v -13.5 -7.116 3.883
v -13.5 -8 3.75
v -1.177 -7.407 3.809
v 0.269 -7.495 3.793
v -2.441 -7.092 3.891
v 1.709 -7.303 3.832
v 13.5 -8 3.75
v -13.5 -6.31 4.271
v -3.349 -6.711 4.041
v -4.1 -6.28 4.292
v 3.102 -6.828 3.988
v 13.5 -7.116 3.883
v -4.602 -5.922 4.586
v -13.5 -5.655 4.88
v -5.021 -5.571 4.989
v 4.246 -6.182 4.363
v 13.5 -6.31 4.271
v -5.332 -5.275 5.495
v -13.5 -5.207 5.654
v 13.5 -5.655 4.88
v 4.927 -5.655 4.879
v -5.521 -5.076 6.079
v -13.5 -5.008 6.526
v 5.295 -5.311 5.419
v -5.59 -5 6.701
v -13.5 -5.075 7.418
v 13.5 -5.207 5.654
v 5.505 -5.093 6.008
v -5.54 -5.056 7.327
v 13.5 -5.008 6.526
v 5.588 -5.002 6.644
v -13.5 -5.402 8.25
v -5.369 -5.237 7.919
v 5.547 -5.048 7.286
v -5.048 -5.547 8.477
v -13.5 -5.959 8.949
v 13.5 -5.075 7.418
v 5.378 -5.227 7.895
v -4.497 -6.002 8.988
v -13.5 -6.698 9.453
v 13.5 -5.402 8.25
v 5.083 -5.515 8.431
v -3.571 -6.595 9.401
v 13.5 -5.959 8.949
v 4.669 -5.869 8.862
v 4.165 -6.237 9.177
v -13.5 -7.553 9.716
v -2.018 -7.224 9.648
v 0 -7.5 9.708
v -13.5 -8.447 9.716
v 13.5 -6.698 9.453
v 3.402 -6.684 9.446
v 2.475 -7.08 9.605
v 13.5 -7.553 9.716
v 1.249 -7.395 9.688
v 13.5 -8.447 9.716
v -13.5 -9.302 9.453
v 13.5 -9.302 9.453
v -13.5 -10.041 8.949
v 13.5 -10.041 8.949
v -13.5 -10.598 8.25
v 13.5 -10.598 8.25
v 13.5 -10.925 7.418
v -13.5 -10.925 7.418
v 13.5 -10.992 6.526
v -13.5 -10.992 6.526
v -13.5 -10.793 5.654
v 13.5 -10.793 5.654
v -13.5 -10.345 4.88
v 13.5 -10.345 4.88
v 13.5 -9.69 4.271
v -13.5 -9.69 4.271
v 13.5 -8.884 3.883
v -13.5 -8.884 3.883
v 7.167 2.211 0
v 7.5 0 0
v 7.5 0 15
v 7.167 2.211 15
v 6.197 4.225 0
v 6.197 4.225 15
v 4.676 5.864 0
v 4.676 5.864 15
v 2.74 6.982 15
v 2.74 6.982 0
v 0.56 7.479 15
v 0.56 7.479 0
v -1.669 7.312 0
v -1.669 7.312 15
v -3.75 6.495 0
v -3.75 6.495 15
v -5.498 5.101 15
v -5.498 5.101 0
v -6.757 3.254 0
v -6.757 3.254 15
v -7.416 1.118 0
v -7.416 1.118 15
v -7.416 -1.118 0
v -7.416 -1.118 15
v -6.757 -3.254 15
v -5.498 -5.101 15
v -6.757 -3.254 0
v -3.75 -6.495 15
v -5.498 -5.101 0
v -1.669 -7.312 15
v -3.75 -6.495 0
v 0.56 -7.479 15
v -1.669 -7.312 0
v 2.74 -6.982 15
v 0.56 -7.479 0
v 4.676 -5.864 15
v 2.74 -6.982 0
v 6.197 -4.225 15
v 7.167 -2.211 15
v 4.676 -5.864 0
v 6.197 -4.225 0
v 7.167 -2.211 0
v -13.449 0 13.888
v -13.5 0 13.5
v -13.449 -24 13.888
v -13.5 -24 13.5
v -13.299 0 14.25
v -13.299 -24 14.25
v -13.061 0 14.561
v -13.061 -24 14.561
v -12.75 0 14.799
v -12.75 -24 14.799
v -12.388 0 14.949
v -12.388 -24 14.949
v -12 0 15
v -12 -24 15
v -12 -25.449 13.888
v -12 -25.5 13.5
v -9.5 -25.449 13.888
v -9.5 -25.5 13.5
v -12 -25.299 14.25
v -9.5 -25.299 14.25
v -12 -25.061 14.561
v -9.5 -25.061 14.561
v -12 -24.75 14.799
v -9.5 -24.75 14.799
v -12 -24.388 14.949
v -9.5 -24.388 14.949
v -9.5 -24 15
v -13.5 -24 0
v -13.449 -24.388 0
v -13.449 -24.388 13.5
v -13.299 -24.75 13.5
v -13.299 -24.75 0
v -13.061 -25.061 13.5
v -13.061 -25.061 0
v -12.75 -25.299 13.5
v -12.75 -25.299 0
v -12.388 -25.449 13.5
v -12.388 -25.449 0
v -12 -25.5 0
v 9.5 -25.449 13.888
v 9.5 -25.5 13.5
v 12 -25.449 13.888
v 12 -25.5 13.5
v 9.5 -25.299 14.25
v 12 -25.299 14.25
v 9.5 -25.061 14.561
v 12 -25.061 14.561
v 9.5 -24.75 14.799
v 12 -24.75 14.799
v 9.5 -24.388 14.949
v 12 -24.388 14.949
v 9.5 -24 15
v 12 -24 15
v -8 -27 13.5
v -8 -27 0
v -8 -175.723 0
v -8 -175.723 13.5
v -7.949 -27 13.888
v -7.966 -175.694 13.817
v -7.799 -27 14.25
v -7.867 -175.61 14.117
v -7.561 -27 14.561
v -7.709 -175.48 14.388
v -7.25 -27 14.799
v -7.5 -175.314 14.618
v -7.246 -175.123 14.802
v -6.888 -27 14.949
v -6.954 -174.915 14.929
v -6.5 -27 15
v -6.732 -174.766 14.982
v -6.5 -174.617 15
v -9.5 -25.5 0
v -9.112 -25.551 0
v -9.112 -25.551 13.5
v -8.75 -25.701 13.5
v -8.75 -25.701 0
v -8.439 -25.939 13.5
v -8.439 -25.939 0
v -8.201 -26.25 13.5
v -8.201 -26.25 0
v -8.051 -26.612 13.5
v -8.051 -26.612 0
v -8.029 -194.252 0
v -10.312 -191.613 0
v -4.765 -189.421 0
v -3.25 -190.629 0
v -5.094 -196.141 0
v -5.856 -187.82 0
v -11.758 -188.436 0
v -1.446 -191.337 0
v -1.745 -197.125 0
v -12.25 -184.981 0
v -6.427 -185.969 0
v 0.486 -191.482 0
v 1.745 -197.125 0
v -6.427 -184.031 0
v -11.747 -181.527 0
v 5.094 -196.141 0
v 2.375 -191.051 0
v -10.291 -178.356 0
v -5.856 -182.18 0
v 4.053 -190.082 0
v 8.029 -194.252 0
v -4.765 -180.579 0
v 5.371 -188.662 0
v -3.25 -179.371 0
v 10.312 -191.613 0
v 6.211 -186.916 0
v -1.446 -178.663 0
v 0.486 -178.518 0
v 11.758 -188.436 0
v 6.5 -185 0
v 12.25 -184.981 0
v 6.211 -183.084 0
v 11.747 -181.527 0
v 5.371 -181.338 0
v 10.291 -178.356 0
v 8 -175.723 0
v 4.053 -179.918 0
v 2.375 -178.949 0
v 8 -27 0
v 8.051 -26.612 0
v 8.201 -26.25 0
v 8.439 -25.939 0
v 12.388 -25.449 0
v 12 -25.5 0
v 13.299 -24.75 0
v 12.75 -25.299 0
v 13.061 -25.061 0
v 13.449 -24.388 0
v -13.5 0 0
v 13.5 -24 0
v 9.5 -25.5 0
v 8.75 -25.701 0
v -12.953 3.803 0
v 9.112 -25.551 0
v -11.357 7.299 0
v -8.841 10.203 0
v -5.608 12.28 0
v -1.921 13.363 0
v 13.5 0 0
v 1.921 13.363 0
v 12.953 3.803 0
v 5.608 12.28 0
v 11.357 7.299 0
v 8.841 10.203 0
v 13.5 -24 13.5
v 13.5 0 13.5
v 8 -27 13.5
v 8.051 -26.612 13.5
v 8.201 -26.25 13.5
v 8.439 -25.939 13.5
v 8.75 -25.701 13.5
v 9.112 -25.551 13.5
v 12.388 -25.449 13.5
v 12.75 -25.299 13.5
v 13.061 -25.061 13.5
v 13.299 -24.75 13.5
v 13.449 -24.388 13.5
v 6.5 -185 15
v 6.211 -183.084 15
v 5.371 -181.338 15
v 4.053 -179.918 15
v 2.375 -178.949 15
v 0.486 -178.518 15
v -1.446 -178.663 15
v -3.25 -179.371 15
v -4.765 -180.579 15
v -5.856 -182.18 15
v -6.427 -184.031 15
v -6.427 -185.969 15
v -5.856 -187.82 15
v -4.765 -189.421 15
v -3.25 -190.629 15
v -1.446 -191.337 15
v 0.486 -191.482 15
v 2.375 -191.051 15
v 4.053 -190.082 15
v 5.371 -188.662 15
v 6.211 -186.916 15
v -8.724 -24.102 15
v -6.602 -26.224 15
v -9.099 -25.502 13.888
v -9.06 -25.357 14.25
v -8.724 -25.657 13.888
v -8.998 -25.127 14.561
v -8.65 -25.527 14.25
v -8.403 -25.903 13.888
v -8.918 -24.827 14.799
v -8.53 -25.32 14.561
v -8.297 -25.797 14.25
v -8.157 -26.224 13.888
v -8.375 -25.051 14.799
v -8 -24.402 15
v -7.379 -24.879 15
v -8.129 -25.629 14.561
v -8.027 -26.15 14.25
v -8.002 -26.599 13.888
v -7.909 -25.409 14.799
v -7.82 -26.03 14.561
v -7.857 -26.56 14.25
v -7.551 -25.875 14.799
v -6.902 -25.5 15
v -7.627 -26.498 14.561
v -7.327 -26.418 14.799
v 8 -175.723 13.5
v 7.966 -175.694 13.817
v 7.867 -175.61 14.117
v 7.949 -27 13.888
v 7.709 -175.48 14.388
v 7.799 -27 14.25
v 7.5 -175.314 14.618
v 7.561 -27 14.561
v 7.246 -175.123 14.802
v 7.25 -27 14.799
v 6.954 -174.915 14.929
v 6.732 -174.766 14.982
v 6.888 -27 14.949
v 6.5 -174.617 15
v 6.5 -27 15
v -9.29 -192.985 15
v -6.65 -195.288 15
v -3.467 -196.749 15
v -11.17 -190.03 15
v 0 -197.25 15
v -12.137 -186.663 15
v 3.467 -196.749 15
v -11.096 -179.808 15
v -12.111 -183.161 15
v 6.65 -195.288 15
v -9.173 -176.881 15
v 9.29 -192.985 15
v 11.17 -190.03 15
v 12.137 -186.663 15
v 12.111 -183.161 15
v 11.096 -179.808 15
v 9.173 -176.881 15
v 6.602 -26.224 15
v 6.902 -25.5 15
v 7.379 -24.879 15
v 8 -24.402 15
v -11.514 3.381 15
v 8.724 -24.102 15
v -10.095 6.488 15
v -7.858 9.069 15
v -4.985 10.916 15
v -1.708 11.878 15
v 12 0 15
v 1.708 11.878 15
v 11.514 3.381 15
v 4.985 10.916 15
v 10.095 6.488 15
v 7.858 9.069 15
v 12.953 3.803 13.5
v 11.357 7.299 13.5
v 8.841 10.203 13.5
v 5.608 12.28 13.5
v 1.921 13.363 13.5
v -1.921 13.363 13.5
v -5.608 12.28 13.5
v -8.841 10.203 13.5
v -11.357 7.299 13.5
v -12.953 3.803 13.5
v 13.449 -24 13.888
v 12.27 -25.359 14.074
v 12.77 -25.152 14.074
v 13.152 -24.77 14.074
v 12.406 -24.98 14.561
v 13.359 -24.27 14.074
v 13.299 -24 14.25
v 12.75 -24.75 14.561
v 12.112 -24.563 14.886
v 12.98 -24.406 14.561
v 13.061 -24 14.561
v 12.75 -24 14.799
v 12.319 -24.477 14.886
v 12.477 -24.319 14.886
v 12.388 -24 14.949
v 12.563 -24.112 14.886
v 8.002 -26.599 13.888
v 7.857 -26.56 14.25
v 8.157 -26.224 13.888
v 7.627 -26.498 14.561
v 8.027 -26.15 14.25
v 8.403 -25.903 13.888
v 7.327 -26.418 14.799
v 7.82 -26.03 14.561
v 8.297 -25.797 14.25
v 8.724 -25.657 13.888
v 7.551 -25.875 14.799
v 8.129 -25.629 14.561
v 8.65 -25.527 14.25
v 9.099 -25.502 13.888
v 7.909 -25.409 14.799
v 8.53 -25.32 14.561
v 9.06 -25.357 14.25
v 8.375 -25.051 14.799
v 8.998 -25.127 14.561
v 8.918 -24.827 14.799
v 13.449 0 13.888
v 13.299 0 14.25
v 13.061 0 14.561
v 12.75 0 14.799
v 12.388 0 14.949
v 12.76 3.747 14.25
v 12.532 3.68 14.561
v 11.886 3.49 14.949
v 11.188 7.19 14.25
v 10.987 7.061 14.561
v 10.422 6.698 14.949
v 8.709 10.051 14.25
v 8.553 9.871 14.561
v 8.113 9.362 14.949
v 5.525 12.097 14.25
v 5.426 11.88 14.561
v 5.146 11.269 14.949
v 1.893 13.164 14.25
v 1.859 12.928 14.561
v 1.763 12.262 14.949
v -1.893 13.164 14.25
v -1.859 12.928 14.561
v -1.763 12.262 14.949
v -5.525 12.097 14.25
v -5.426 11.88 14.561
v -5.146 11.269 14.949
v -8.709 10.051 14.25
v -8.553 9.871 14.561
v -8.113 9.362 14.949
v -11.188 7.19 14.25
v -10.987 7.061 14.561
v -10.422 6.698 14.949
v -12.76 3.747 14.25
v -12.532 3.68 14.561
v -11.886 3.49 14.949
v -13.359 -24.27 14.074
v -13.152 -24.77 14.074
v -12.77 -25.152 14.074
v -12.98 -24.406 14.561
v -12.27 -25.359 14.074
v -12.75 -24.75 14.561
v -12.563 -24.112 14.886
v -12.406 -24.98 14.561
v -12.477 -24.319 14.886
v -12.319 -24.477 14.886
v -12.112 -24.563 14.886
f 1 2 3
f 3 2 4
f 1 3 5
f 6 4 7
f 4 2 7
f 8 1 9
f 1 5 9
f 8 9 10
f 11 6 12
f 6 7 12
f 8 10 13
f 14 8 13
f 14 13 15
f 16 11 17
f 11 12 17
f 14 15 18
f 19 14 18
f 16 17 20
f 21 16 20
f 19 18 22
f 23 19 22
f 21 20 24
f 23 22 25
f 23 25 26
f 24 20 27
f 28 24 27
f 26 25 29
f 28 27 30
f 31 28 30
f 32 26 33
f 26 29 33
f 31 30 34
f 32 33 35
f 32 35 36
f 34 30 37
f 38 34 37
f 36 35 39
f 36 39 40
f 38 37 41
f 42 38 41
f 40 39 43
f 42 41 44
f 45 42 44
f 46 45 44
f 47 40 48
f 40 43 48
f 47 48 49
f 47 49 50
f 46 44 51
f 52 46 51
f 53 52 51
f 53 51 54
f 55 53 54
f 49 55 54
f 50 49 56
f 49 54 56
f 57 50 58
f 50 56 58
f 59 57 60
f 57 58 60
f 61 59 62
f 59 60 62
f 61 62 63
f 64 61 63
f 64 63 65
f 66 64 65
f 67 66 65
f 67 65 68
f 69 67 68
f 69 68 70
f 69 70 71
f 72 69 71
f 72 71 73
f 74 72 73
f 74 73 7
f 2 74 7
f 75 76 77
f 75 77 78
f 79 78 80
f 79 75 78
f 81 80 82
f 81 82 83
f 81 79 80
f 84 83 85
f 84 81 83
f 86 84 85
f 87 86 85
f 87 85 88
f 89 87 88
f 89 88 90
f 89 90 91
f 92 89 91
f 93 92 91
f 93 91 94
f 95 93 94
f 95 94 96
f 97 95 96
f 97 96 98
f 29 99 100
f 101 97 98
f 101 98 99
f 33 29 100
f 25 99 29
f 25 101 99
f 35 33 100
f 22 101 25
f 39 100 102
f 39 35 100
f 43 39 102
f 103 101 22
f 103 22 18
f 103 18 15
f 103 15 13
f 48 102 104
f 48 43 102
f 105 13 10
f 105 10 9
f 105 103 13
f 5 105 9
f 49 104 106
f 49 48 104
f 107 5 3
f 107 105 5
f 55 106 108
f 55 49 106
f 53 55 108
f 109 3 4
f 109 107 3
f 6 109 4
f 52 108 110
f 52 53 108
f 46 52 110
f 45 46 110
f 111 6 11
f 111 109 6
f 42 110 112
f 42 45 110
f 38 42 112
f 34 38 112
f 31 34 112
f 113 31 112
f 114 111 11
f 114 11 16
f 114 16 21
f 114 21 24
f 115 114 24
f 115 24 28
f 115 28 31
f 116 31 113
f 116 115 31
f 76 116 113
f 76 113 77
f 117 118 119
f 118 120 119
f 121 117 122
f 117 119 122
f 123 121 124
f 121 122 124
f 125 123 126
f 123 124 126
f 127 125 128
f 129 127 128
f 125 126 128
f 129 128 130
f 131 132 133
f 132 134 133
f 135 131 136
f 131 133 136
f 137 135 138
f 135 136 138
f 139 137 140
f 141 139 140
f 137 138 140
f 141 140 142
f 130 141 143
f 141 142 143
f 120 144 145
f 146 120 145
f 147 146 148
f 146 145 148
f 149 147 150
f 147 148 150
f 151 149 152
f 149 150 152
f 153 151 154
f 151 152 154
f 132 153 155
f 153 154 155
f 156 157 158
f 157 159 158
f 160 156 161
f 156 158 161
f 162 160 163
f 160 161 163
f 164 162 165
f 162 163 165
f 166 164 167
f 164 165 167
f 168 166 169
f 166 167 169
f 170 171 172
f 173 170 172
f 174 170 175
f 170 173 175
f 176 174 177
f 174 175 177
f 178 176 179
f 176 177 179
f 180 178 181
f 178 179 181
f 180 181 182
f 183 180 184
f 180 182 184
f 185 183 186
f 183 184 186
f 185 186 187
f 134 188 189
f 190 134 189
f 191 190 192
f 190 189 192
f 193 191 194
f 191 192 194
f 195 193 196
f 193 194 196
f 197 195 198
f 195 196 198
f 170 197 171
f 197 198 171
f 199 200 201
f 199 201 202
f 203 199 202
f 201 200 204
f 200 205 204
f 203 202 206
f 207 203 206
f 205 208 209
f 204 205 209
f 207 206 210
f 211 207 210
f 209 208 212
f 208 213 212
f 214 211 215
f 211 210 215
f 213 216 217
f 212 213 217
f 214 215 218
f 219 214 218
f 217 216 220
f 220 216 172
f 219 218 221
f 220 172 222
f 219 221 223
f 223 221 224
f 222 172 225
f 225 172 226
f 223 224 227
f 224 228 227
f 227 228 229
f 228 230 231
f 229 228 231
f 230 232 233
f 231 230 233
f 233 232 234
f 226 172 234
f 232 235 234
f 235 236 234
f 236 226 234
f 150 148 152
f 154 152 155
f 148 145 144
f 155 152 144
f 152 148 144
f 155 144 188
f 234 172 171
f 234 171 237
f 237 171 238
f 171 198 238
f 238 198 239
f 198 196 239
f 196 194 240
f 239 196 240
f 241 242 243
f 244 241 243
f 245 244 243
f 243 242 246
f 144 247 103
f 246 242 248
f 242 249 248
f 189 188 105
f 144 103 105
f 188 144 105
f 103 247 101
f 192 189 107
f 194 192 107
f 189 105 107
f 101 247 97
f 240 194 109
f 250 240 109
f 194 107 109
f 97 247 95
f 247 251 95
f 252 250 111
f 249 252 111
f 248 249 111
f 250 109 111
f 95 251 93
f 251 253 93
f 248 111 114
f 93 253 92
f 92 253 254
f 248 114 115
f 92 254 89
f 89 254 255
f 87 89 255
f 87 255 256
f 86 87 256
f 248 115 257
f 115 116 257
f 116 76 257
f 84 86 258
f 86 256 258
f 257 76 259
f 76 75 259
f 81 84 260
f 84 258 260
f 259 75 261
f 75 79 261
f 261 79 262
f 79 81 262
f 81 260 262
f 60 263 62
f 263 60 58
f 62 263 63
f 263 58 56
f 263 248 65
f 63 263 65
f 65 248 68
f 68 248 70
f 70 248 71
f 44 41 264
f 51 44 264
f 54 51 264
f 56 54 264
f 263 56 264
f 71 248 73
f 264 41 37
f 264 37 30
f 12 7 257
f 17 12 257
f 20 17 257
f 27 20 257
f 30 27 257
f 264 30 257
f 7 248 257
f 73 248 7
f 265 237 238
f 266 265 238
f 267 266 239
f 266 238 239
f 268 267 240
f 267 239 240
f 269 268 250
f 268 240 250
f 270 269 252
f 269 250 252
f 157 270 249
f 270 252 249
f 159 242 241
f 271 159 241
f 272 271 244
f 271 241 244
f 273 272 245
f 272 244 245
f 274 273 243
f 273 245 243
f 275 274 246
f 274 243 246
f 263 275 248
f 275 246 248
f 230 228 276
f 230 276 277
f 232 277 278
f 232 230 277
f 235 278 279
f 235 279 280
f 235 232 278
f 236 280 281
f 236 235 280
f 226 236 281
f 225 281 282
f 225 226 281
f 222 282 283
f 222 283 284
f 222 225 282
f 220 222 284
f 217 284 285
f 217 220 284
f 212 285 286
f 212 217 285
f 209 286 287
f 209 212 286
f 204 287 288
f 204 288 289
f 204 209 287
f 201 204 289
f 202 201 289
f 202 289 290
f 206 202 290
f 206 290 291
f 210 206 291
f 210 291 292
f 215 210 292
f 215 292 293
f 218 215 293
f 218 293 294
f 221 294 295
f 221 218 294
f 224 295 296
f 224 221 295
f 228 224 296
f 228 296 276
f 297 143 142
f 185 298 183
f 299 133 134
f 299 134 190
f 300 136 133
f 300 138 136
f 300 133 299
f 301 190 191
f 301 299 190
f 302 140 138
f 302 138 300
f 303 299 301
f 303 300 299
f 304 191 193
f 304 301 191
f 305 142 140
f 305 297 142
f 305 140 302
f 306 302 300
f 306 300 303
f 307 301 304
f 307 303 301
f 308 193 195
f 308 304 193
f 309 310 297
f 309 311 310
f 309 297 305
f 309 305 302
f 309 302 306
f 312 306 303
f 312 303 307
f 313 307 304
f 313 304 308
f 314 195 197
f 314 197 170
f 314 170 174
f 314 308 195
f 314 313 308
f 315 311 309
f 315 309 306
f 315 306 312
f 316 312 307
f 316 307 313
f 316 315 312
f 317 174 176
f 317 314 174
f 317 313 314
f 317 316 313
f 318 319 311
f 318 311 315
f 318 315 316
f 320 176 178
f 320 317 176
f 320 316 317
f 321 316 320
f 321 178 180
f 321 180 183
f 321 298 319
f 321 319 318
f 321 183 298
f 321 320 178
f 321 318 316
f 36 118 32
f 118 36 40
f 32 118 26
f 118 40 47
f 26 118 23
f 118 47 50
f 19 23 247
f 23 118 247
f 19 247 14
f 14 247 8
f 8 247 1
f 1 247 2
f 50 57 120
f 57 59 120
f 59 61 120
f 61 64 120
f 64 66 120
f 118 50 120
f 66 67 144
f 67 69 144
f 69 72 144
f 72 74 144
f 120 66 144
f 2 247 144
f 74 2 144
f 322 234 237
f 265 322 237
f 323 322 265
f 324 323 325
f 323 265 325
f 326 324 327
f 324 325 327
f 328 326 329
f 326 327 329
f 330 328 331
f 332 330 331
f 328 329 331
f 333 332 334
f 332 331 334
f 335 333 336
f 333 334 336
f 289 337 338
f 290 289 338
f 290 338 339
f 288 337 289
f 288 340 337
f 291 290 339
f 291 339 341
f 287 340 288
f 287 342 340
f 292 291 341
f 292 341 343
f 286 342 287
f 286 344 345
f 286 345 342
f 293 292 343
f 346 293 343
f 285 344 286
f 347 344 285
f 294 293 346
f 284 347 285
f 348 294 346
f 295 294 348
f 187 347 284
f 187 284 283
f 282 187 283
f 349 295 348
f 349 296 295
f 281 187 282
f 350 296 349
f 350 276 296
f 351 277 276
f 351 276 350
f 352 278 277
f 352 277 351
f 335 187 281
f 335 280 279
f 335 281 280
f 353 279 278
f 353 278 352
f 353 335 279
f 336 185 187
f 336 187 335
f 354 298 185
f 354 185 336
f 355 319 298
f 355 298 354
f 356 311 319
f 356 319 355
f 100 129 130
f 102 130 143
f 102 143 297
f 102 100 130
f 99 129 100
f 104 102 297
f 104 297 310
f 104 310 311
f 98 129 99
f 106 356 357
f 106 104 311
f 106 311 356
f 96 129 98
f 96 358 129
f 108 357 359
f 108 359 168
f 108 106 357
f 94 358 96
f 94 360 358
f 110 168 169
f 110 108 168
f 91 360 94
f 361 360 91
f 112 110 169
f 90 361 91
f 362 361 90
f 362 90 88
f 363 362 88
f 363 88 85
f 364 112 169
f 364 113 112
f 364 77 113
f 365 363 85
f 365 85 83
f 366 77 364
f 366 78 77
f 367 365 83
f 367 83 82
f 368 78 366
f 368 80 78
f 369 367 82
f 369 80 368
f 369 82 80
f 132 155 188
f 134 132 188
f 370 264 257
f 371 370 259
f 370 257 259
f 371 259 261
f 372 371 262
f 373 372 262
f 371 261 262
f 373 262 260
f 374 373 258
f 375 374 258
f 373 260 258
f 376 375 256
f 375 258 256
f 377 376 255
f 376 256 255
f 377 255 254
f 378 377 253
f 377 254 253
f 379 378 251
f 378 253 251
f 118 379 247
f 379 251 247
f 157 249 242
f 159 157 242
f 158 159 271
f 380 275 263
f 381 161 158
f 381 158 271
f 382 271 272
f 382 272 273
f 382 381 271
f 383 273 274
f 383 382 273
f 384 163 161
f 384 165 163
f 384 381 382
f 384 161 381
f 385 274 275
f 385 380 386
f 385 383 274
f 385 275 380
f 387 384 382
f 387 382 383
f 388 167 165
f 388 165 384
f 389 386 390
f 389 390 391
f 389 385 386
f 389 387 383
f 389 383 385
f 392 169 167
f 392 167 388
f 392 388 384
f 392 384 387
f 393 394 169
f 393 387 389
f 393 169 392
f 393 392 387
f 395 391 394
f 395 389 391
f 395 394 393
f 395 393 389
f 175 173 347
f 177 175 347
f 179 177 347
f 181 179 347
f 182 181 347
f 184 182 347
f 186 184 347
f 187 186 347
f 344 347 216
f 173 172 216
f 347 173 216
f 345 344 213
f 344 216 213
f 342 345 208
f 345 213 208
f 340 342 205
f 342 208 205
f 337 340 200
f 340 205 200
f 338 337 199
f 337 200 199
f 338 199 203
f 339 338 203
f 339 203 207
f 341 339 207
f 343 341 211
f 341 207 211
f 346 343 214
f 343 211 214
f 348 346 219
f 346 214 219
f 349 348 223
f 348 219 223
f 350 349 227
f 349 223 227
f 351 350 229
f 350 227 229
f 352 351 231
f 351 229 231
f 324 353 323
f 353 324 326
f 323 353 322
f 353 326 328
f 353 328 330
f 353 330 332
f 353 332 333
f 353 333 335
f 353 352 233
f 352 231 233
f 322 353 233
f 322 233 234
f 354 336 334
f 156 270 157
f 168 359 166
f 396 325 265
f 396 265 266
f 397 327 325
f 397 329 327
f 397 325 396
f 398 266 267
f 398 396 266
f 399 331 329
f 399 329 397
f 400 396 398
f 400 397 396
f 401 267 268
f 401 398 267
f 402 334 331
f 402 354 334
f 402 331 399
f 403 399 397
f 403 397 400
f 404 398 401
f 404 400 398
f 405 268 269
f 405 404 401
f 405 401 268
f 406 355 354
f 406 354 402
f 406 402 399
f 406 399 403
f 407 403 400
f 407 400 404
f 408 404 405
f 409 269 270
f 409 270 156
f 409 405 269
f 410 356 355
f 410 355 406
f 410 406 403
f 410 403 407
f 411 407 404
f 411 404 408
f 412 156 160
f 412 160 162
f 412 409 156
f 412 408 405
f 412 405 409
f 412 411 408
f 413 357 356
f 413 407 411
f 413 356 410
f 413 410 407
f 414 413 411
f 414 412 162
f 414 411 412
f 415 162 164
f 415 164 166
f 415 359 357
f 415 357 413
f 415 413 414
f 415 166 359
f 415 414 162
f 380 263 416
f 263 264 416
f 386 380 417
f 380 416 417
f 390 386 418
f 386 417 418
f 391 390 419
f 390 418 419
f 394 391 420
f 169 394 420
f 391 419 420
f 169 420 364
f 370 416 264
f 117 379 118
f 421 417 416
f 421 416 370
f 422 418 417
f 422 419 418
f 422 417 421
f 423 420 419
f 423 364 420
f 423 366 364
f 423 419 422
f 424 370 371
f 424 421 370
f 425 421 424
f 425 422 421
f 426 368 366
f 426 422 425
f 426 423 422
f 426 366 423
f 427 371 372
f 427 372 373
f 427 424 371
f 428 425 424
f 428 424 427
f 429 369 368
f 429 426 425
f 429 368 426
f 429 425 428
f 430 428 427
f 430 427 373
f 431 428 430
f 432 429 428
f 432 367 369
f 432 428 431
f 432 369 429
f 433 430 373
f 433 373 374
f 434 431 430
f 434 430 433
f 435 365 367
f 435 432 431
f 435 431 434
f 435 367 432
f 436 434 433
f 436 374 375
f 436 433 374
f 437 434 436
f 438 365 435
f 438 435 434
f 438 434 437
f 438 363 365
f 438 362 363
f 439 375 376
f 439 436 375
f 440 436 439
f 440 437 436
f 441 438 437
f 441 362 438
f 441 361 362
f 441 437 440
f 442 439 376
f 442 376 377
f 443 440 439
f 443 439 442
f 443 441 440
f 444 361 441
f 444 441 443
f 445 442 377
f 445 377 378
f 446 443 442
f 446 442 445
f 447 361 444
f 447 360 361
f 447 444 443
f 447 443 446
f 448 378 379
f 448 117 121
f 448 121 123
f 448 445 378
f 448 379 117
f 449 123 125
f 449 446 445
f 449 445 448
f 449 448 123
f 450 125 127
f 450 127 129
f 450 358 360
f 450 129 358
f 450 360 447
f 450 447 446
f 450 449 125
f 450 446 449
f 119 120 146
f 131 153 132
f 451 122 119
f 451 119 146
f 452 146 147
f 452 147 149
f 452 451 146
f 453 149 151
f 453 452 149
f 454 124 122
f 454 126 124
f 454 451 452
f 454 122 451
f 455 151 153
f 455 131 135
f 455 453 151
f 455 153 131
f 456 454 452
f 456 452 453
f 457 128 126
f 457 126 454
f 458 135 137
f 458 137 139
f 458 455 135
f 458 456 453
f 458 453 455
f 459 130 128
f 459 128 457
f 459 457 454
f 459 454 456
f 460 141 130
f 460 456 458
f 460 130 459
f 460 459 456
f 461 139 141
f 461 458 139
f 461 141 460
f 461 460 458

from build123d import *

# Parameters (mm, degrees)
SKETCH1_R           = 6.5
SKETCH1_R_2         = 7.5
BOSS_EXTRUDE1_DEPTH = 15
FILLET2_R           = 1.5
SKETCH4_R           = 3
CUT_EXTRUDE1_DEPTH  = 28


with BuildPart() as part:
    # Sketch1 → Boss-Extrude1 (new body)
    with BuildSketch(Plane.XY):
        with BuildLine():
            Line((-13.5, 0), (-13.5, -24))
            ThreePointArc((-13.5, -24), (-13.060660172, -25.060660172), (-12, -25.5))
            Line((-12, -25.5), (-9.5, -25.5))
            ThreePointArc((-9.5, -25.5), (-8.439339828, -25.939339828), (-8, -27))
            Line((-8, -27), (-8, -175.723012342))
            ThreePointArc((-8, -175.723012342), (0, -197.25), (8, -175.723012342))
            Line((8, -175.723012342), (8, -27))
            ThreePointArc((8, -27), (8.439339828, -25.939339828), (9.5, -25.5))
            Line((9.5, -25.5), (12, -25.5))
            ThreePointArc((12, -25.5), (13.060660172, -25.060660172), (13.5, -24))
            Line((13.5, -24), (13.5, 0))
            ThreePointArc((13.5, 0), (0, 13.5), (-13.5, 0))
        make_face()
        with Locations((0, -185)):
            Circle(SKETCH1_R, mode=Mode.SUBTRACT)
        Circle(SKETCH1_R_2, mode=Mode.SUBTRACT)
    extrude(amount=BOSS_EXTRUDE1_DEPTH)

    # Fillet2
    fillet2_edges = [part.edges().sort_by_distance(p)[0] for p in [
        (-13.060660172, -25.060660172, 15),
        (-10.75, -25.5, 15),
        (-8.439339828, -25.939339828, 15),
        (-8, -101.361506171, 15),
        (8, -101.361506171, 15),
        (8.439339828, -25.939339828, 15),
        (10.75, -25.5, 15),
        (13.060660172, -25.060660172, 15),
        (13.5, -12, 15),
        (0, 13.5, 15),
        (-13.5, -12, 15),
    ]]
    fillet(fillet2_edges, radius=FILLET2_R)

    # Sketch4 → Cut-Extrude1 (cut, through all)
    with BuildSketch(Plane(origin=(13.5, 0, 0), x_dir=(0, 0, -1), z_dir=(1, 0, 0))):
        with Locations((-6.75, -8)):
            Circle(SKETCH4_R)
    extrude(amount=-CUT_EXTRUDE1_DEPTH, mode=Mode.SUBTRACT)


solid = part.part
